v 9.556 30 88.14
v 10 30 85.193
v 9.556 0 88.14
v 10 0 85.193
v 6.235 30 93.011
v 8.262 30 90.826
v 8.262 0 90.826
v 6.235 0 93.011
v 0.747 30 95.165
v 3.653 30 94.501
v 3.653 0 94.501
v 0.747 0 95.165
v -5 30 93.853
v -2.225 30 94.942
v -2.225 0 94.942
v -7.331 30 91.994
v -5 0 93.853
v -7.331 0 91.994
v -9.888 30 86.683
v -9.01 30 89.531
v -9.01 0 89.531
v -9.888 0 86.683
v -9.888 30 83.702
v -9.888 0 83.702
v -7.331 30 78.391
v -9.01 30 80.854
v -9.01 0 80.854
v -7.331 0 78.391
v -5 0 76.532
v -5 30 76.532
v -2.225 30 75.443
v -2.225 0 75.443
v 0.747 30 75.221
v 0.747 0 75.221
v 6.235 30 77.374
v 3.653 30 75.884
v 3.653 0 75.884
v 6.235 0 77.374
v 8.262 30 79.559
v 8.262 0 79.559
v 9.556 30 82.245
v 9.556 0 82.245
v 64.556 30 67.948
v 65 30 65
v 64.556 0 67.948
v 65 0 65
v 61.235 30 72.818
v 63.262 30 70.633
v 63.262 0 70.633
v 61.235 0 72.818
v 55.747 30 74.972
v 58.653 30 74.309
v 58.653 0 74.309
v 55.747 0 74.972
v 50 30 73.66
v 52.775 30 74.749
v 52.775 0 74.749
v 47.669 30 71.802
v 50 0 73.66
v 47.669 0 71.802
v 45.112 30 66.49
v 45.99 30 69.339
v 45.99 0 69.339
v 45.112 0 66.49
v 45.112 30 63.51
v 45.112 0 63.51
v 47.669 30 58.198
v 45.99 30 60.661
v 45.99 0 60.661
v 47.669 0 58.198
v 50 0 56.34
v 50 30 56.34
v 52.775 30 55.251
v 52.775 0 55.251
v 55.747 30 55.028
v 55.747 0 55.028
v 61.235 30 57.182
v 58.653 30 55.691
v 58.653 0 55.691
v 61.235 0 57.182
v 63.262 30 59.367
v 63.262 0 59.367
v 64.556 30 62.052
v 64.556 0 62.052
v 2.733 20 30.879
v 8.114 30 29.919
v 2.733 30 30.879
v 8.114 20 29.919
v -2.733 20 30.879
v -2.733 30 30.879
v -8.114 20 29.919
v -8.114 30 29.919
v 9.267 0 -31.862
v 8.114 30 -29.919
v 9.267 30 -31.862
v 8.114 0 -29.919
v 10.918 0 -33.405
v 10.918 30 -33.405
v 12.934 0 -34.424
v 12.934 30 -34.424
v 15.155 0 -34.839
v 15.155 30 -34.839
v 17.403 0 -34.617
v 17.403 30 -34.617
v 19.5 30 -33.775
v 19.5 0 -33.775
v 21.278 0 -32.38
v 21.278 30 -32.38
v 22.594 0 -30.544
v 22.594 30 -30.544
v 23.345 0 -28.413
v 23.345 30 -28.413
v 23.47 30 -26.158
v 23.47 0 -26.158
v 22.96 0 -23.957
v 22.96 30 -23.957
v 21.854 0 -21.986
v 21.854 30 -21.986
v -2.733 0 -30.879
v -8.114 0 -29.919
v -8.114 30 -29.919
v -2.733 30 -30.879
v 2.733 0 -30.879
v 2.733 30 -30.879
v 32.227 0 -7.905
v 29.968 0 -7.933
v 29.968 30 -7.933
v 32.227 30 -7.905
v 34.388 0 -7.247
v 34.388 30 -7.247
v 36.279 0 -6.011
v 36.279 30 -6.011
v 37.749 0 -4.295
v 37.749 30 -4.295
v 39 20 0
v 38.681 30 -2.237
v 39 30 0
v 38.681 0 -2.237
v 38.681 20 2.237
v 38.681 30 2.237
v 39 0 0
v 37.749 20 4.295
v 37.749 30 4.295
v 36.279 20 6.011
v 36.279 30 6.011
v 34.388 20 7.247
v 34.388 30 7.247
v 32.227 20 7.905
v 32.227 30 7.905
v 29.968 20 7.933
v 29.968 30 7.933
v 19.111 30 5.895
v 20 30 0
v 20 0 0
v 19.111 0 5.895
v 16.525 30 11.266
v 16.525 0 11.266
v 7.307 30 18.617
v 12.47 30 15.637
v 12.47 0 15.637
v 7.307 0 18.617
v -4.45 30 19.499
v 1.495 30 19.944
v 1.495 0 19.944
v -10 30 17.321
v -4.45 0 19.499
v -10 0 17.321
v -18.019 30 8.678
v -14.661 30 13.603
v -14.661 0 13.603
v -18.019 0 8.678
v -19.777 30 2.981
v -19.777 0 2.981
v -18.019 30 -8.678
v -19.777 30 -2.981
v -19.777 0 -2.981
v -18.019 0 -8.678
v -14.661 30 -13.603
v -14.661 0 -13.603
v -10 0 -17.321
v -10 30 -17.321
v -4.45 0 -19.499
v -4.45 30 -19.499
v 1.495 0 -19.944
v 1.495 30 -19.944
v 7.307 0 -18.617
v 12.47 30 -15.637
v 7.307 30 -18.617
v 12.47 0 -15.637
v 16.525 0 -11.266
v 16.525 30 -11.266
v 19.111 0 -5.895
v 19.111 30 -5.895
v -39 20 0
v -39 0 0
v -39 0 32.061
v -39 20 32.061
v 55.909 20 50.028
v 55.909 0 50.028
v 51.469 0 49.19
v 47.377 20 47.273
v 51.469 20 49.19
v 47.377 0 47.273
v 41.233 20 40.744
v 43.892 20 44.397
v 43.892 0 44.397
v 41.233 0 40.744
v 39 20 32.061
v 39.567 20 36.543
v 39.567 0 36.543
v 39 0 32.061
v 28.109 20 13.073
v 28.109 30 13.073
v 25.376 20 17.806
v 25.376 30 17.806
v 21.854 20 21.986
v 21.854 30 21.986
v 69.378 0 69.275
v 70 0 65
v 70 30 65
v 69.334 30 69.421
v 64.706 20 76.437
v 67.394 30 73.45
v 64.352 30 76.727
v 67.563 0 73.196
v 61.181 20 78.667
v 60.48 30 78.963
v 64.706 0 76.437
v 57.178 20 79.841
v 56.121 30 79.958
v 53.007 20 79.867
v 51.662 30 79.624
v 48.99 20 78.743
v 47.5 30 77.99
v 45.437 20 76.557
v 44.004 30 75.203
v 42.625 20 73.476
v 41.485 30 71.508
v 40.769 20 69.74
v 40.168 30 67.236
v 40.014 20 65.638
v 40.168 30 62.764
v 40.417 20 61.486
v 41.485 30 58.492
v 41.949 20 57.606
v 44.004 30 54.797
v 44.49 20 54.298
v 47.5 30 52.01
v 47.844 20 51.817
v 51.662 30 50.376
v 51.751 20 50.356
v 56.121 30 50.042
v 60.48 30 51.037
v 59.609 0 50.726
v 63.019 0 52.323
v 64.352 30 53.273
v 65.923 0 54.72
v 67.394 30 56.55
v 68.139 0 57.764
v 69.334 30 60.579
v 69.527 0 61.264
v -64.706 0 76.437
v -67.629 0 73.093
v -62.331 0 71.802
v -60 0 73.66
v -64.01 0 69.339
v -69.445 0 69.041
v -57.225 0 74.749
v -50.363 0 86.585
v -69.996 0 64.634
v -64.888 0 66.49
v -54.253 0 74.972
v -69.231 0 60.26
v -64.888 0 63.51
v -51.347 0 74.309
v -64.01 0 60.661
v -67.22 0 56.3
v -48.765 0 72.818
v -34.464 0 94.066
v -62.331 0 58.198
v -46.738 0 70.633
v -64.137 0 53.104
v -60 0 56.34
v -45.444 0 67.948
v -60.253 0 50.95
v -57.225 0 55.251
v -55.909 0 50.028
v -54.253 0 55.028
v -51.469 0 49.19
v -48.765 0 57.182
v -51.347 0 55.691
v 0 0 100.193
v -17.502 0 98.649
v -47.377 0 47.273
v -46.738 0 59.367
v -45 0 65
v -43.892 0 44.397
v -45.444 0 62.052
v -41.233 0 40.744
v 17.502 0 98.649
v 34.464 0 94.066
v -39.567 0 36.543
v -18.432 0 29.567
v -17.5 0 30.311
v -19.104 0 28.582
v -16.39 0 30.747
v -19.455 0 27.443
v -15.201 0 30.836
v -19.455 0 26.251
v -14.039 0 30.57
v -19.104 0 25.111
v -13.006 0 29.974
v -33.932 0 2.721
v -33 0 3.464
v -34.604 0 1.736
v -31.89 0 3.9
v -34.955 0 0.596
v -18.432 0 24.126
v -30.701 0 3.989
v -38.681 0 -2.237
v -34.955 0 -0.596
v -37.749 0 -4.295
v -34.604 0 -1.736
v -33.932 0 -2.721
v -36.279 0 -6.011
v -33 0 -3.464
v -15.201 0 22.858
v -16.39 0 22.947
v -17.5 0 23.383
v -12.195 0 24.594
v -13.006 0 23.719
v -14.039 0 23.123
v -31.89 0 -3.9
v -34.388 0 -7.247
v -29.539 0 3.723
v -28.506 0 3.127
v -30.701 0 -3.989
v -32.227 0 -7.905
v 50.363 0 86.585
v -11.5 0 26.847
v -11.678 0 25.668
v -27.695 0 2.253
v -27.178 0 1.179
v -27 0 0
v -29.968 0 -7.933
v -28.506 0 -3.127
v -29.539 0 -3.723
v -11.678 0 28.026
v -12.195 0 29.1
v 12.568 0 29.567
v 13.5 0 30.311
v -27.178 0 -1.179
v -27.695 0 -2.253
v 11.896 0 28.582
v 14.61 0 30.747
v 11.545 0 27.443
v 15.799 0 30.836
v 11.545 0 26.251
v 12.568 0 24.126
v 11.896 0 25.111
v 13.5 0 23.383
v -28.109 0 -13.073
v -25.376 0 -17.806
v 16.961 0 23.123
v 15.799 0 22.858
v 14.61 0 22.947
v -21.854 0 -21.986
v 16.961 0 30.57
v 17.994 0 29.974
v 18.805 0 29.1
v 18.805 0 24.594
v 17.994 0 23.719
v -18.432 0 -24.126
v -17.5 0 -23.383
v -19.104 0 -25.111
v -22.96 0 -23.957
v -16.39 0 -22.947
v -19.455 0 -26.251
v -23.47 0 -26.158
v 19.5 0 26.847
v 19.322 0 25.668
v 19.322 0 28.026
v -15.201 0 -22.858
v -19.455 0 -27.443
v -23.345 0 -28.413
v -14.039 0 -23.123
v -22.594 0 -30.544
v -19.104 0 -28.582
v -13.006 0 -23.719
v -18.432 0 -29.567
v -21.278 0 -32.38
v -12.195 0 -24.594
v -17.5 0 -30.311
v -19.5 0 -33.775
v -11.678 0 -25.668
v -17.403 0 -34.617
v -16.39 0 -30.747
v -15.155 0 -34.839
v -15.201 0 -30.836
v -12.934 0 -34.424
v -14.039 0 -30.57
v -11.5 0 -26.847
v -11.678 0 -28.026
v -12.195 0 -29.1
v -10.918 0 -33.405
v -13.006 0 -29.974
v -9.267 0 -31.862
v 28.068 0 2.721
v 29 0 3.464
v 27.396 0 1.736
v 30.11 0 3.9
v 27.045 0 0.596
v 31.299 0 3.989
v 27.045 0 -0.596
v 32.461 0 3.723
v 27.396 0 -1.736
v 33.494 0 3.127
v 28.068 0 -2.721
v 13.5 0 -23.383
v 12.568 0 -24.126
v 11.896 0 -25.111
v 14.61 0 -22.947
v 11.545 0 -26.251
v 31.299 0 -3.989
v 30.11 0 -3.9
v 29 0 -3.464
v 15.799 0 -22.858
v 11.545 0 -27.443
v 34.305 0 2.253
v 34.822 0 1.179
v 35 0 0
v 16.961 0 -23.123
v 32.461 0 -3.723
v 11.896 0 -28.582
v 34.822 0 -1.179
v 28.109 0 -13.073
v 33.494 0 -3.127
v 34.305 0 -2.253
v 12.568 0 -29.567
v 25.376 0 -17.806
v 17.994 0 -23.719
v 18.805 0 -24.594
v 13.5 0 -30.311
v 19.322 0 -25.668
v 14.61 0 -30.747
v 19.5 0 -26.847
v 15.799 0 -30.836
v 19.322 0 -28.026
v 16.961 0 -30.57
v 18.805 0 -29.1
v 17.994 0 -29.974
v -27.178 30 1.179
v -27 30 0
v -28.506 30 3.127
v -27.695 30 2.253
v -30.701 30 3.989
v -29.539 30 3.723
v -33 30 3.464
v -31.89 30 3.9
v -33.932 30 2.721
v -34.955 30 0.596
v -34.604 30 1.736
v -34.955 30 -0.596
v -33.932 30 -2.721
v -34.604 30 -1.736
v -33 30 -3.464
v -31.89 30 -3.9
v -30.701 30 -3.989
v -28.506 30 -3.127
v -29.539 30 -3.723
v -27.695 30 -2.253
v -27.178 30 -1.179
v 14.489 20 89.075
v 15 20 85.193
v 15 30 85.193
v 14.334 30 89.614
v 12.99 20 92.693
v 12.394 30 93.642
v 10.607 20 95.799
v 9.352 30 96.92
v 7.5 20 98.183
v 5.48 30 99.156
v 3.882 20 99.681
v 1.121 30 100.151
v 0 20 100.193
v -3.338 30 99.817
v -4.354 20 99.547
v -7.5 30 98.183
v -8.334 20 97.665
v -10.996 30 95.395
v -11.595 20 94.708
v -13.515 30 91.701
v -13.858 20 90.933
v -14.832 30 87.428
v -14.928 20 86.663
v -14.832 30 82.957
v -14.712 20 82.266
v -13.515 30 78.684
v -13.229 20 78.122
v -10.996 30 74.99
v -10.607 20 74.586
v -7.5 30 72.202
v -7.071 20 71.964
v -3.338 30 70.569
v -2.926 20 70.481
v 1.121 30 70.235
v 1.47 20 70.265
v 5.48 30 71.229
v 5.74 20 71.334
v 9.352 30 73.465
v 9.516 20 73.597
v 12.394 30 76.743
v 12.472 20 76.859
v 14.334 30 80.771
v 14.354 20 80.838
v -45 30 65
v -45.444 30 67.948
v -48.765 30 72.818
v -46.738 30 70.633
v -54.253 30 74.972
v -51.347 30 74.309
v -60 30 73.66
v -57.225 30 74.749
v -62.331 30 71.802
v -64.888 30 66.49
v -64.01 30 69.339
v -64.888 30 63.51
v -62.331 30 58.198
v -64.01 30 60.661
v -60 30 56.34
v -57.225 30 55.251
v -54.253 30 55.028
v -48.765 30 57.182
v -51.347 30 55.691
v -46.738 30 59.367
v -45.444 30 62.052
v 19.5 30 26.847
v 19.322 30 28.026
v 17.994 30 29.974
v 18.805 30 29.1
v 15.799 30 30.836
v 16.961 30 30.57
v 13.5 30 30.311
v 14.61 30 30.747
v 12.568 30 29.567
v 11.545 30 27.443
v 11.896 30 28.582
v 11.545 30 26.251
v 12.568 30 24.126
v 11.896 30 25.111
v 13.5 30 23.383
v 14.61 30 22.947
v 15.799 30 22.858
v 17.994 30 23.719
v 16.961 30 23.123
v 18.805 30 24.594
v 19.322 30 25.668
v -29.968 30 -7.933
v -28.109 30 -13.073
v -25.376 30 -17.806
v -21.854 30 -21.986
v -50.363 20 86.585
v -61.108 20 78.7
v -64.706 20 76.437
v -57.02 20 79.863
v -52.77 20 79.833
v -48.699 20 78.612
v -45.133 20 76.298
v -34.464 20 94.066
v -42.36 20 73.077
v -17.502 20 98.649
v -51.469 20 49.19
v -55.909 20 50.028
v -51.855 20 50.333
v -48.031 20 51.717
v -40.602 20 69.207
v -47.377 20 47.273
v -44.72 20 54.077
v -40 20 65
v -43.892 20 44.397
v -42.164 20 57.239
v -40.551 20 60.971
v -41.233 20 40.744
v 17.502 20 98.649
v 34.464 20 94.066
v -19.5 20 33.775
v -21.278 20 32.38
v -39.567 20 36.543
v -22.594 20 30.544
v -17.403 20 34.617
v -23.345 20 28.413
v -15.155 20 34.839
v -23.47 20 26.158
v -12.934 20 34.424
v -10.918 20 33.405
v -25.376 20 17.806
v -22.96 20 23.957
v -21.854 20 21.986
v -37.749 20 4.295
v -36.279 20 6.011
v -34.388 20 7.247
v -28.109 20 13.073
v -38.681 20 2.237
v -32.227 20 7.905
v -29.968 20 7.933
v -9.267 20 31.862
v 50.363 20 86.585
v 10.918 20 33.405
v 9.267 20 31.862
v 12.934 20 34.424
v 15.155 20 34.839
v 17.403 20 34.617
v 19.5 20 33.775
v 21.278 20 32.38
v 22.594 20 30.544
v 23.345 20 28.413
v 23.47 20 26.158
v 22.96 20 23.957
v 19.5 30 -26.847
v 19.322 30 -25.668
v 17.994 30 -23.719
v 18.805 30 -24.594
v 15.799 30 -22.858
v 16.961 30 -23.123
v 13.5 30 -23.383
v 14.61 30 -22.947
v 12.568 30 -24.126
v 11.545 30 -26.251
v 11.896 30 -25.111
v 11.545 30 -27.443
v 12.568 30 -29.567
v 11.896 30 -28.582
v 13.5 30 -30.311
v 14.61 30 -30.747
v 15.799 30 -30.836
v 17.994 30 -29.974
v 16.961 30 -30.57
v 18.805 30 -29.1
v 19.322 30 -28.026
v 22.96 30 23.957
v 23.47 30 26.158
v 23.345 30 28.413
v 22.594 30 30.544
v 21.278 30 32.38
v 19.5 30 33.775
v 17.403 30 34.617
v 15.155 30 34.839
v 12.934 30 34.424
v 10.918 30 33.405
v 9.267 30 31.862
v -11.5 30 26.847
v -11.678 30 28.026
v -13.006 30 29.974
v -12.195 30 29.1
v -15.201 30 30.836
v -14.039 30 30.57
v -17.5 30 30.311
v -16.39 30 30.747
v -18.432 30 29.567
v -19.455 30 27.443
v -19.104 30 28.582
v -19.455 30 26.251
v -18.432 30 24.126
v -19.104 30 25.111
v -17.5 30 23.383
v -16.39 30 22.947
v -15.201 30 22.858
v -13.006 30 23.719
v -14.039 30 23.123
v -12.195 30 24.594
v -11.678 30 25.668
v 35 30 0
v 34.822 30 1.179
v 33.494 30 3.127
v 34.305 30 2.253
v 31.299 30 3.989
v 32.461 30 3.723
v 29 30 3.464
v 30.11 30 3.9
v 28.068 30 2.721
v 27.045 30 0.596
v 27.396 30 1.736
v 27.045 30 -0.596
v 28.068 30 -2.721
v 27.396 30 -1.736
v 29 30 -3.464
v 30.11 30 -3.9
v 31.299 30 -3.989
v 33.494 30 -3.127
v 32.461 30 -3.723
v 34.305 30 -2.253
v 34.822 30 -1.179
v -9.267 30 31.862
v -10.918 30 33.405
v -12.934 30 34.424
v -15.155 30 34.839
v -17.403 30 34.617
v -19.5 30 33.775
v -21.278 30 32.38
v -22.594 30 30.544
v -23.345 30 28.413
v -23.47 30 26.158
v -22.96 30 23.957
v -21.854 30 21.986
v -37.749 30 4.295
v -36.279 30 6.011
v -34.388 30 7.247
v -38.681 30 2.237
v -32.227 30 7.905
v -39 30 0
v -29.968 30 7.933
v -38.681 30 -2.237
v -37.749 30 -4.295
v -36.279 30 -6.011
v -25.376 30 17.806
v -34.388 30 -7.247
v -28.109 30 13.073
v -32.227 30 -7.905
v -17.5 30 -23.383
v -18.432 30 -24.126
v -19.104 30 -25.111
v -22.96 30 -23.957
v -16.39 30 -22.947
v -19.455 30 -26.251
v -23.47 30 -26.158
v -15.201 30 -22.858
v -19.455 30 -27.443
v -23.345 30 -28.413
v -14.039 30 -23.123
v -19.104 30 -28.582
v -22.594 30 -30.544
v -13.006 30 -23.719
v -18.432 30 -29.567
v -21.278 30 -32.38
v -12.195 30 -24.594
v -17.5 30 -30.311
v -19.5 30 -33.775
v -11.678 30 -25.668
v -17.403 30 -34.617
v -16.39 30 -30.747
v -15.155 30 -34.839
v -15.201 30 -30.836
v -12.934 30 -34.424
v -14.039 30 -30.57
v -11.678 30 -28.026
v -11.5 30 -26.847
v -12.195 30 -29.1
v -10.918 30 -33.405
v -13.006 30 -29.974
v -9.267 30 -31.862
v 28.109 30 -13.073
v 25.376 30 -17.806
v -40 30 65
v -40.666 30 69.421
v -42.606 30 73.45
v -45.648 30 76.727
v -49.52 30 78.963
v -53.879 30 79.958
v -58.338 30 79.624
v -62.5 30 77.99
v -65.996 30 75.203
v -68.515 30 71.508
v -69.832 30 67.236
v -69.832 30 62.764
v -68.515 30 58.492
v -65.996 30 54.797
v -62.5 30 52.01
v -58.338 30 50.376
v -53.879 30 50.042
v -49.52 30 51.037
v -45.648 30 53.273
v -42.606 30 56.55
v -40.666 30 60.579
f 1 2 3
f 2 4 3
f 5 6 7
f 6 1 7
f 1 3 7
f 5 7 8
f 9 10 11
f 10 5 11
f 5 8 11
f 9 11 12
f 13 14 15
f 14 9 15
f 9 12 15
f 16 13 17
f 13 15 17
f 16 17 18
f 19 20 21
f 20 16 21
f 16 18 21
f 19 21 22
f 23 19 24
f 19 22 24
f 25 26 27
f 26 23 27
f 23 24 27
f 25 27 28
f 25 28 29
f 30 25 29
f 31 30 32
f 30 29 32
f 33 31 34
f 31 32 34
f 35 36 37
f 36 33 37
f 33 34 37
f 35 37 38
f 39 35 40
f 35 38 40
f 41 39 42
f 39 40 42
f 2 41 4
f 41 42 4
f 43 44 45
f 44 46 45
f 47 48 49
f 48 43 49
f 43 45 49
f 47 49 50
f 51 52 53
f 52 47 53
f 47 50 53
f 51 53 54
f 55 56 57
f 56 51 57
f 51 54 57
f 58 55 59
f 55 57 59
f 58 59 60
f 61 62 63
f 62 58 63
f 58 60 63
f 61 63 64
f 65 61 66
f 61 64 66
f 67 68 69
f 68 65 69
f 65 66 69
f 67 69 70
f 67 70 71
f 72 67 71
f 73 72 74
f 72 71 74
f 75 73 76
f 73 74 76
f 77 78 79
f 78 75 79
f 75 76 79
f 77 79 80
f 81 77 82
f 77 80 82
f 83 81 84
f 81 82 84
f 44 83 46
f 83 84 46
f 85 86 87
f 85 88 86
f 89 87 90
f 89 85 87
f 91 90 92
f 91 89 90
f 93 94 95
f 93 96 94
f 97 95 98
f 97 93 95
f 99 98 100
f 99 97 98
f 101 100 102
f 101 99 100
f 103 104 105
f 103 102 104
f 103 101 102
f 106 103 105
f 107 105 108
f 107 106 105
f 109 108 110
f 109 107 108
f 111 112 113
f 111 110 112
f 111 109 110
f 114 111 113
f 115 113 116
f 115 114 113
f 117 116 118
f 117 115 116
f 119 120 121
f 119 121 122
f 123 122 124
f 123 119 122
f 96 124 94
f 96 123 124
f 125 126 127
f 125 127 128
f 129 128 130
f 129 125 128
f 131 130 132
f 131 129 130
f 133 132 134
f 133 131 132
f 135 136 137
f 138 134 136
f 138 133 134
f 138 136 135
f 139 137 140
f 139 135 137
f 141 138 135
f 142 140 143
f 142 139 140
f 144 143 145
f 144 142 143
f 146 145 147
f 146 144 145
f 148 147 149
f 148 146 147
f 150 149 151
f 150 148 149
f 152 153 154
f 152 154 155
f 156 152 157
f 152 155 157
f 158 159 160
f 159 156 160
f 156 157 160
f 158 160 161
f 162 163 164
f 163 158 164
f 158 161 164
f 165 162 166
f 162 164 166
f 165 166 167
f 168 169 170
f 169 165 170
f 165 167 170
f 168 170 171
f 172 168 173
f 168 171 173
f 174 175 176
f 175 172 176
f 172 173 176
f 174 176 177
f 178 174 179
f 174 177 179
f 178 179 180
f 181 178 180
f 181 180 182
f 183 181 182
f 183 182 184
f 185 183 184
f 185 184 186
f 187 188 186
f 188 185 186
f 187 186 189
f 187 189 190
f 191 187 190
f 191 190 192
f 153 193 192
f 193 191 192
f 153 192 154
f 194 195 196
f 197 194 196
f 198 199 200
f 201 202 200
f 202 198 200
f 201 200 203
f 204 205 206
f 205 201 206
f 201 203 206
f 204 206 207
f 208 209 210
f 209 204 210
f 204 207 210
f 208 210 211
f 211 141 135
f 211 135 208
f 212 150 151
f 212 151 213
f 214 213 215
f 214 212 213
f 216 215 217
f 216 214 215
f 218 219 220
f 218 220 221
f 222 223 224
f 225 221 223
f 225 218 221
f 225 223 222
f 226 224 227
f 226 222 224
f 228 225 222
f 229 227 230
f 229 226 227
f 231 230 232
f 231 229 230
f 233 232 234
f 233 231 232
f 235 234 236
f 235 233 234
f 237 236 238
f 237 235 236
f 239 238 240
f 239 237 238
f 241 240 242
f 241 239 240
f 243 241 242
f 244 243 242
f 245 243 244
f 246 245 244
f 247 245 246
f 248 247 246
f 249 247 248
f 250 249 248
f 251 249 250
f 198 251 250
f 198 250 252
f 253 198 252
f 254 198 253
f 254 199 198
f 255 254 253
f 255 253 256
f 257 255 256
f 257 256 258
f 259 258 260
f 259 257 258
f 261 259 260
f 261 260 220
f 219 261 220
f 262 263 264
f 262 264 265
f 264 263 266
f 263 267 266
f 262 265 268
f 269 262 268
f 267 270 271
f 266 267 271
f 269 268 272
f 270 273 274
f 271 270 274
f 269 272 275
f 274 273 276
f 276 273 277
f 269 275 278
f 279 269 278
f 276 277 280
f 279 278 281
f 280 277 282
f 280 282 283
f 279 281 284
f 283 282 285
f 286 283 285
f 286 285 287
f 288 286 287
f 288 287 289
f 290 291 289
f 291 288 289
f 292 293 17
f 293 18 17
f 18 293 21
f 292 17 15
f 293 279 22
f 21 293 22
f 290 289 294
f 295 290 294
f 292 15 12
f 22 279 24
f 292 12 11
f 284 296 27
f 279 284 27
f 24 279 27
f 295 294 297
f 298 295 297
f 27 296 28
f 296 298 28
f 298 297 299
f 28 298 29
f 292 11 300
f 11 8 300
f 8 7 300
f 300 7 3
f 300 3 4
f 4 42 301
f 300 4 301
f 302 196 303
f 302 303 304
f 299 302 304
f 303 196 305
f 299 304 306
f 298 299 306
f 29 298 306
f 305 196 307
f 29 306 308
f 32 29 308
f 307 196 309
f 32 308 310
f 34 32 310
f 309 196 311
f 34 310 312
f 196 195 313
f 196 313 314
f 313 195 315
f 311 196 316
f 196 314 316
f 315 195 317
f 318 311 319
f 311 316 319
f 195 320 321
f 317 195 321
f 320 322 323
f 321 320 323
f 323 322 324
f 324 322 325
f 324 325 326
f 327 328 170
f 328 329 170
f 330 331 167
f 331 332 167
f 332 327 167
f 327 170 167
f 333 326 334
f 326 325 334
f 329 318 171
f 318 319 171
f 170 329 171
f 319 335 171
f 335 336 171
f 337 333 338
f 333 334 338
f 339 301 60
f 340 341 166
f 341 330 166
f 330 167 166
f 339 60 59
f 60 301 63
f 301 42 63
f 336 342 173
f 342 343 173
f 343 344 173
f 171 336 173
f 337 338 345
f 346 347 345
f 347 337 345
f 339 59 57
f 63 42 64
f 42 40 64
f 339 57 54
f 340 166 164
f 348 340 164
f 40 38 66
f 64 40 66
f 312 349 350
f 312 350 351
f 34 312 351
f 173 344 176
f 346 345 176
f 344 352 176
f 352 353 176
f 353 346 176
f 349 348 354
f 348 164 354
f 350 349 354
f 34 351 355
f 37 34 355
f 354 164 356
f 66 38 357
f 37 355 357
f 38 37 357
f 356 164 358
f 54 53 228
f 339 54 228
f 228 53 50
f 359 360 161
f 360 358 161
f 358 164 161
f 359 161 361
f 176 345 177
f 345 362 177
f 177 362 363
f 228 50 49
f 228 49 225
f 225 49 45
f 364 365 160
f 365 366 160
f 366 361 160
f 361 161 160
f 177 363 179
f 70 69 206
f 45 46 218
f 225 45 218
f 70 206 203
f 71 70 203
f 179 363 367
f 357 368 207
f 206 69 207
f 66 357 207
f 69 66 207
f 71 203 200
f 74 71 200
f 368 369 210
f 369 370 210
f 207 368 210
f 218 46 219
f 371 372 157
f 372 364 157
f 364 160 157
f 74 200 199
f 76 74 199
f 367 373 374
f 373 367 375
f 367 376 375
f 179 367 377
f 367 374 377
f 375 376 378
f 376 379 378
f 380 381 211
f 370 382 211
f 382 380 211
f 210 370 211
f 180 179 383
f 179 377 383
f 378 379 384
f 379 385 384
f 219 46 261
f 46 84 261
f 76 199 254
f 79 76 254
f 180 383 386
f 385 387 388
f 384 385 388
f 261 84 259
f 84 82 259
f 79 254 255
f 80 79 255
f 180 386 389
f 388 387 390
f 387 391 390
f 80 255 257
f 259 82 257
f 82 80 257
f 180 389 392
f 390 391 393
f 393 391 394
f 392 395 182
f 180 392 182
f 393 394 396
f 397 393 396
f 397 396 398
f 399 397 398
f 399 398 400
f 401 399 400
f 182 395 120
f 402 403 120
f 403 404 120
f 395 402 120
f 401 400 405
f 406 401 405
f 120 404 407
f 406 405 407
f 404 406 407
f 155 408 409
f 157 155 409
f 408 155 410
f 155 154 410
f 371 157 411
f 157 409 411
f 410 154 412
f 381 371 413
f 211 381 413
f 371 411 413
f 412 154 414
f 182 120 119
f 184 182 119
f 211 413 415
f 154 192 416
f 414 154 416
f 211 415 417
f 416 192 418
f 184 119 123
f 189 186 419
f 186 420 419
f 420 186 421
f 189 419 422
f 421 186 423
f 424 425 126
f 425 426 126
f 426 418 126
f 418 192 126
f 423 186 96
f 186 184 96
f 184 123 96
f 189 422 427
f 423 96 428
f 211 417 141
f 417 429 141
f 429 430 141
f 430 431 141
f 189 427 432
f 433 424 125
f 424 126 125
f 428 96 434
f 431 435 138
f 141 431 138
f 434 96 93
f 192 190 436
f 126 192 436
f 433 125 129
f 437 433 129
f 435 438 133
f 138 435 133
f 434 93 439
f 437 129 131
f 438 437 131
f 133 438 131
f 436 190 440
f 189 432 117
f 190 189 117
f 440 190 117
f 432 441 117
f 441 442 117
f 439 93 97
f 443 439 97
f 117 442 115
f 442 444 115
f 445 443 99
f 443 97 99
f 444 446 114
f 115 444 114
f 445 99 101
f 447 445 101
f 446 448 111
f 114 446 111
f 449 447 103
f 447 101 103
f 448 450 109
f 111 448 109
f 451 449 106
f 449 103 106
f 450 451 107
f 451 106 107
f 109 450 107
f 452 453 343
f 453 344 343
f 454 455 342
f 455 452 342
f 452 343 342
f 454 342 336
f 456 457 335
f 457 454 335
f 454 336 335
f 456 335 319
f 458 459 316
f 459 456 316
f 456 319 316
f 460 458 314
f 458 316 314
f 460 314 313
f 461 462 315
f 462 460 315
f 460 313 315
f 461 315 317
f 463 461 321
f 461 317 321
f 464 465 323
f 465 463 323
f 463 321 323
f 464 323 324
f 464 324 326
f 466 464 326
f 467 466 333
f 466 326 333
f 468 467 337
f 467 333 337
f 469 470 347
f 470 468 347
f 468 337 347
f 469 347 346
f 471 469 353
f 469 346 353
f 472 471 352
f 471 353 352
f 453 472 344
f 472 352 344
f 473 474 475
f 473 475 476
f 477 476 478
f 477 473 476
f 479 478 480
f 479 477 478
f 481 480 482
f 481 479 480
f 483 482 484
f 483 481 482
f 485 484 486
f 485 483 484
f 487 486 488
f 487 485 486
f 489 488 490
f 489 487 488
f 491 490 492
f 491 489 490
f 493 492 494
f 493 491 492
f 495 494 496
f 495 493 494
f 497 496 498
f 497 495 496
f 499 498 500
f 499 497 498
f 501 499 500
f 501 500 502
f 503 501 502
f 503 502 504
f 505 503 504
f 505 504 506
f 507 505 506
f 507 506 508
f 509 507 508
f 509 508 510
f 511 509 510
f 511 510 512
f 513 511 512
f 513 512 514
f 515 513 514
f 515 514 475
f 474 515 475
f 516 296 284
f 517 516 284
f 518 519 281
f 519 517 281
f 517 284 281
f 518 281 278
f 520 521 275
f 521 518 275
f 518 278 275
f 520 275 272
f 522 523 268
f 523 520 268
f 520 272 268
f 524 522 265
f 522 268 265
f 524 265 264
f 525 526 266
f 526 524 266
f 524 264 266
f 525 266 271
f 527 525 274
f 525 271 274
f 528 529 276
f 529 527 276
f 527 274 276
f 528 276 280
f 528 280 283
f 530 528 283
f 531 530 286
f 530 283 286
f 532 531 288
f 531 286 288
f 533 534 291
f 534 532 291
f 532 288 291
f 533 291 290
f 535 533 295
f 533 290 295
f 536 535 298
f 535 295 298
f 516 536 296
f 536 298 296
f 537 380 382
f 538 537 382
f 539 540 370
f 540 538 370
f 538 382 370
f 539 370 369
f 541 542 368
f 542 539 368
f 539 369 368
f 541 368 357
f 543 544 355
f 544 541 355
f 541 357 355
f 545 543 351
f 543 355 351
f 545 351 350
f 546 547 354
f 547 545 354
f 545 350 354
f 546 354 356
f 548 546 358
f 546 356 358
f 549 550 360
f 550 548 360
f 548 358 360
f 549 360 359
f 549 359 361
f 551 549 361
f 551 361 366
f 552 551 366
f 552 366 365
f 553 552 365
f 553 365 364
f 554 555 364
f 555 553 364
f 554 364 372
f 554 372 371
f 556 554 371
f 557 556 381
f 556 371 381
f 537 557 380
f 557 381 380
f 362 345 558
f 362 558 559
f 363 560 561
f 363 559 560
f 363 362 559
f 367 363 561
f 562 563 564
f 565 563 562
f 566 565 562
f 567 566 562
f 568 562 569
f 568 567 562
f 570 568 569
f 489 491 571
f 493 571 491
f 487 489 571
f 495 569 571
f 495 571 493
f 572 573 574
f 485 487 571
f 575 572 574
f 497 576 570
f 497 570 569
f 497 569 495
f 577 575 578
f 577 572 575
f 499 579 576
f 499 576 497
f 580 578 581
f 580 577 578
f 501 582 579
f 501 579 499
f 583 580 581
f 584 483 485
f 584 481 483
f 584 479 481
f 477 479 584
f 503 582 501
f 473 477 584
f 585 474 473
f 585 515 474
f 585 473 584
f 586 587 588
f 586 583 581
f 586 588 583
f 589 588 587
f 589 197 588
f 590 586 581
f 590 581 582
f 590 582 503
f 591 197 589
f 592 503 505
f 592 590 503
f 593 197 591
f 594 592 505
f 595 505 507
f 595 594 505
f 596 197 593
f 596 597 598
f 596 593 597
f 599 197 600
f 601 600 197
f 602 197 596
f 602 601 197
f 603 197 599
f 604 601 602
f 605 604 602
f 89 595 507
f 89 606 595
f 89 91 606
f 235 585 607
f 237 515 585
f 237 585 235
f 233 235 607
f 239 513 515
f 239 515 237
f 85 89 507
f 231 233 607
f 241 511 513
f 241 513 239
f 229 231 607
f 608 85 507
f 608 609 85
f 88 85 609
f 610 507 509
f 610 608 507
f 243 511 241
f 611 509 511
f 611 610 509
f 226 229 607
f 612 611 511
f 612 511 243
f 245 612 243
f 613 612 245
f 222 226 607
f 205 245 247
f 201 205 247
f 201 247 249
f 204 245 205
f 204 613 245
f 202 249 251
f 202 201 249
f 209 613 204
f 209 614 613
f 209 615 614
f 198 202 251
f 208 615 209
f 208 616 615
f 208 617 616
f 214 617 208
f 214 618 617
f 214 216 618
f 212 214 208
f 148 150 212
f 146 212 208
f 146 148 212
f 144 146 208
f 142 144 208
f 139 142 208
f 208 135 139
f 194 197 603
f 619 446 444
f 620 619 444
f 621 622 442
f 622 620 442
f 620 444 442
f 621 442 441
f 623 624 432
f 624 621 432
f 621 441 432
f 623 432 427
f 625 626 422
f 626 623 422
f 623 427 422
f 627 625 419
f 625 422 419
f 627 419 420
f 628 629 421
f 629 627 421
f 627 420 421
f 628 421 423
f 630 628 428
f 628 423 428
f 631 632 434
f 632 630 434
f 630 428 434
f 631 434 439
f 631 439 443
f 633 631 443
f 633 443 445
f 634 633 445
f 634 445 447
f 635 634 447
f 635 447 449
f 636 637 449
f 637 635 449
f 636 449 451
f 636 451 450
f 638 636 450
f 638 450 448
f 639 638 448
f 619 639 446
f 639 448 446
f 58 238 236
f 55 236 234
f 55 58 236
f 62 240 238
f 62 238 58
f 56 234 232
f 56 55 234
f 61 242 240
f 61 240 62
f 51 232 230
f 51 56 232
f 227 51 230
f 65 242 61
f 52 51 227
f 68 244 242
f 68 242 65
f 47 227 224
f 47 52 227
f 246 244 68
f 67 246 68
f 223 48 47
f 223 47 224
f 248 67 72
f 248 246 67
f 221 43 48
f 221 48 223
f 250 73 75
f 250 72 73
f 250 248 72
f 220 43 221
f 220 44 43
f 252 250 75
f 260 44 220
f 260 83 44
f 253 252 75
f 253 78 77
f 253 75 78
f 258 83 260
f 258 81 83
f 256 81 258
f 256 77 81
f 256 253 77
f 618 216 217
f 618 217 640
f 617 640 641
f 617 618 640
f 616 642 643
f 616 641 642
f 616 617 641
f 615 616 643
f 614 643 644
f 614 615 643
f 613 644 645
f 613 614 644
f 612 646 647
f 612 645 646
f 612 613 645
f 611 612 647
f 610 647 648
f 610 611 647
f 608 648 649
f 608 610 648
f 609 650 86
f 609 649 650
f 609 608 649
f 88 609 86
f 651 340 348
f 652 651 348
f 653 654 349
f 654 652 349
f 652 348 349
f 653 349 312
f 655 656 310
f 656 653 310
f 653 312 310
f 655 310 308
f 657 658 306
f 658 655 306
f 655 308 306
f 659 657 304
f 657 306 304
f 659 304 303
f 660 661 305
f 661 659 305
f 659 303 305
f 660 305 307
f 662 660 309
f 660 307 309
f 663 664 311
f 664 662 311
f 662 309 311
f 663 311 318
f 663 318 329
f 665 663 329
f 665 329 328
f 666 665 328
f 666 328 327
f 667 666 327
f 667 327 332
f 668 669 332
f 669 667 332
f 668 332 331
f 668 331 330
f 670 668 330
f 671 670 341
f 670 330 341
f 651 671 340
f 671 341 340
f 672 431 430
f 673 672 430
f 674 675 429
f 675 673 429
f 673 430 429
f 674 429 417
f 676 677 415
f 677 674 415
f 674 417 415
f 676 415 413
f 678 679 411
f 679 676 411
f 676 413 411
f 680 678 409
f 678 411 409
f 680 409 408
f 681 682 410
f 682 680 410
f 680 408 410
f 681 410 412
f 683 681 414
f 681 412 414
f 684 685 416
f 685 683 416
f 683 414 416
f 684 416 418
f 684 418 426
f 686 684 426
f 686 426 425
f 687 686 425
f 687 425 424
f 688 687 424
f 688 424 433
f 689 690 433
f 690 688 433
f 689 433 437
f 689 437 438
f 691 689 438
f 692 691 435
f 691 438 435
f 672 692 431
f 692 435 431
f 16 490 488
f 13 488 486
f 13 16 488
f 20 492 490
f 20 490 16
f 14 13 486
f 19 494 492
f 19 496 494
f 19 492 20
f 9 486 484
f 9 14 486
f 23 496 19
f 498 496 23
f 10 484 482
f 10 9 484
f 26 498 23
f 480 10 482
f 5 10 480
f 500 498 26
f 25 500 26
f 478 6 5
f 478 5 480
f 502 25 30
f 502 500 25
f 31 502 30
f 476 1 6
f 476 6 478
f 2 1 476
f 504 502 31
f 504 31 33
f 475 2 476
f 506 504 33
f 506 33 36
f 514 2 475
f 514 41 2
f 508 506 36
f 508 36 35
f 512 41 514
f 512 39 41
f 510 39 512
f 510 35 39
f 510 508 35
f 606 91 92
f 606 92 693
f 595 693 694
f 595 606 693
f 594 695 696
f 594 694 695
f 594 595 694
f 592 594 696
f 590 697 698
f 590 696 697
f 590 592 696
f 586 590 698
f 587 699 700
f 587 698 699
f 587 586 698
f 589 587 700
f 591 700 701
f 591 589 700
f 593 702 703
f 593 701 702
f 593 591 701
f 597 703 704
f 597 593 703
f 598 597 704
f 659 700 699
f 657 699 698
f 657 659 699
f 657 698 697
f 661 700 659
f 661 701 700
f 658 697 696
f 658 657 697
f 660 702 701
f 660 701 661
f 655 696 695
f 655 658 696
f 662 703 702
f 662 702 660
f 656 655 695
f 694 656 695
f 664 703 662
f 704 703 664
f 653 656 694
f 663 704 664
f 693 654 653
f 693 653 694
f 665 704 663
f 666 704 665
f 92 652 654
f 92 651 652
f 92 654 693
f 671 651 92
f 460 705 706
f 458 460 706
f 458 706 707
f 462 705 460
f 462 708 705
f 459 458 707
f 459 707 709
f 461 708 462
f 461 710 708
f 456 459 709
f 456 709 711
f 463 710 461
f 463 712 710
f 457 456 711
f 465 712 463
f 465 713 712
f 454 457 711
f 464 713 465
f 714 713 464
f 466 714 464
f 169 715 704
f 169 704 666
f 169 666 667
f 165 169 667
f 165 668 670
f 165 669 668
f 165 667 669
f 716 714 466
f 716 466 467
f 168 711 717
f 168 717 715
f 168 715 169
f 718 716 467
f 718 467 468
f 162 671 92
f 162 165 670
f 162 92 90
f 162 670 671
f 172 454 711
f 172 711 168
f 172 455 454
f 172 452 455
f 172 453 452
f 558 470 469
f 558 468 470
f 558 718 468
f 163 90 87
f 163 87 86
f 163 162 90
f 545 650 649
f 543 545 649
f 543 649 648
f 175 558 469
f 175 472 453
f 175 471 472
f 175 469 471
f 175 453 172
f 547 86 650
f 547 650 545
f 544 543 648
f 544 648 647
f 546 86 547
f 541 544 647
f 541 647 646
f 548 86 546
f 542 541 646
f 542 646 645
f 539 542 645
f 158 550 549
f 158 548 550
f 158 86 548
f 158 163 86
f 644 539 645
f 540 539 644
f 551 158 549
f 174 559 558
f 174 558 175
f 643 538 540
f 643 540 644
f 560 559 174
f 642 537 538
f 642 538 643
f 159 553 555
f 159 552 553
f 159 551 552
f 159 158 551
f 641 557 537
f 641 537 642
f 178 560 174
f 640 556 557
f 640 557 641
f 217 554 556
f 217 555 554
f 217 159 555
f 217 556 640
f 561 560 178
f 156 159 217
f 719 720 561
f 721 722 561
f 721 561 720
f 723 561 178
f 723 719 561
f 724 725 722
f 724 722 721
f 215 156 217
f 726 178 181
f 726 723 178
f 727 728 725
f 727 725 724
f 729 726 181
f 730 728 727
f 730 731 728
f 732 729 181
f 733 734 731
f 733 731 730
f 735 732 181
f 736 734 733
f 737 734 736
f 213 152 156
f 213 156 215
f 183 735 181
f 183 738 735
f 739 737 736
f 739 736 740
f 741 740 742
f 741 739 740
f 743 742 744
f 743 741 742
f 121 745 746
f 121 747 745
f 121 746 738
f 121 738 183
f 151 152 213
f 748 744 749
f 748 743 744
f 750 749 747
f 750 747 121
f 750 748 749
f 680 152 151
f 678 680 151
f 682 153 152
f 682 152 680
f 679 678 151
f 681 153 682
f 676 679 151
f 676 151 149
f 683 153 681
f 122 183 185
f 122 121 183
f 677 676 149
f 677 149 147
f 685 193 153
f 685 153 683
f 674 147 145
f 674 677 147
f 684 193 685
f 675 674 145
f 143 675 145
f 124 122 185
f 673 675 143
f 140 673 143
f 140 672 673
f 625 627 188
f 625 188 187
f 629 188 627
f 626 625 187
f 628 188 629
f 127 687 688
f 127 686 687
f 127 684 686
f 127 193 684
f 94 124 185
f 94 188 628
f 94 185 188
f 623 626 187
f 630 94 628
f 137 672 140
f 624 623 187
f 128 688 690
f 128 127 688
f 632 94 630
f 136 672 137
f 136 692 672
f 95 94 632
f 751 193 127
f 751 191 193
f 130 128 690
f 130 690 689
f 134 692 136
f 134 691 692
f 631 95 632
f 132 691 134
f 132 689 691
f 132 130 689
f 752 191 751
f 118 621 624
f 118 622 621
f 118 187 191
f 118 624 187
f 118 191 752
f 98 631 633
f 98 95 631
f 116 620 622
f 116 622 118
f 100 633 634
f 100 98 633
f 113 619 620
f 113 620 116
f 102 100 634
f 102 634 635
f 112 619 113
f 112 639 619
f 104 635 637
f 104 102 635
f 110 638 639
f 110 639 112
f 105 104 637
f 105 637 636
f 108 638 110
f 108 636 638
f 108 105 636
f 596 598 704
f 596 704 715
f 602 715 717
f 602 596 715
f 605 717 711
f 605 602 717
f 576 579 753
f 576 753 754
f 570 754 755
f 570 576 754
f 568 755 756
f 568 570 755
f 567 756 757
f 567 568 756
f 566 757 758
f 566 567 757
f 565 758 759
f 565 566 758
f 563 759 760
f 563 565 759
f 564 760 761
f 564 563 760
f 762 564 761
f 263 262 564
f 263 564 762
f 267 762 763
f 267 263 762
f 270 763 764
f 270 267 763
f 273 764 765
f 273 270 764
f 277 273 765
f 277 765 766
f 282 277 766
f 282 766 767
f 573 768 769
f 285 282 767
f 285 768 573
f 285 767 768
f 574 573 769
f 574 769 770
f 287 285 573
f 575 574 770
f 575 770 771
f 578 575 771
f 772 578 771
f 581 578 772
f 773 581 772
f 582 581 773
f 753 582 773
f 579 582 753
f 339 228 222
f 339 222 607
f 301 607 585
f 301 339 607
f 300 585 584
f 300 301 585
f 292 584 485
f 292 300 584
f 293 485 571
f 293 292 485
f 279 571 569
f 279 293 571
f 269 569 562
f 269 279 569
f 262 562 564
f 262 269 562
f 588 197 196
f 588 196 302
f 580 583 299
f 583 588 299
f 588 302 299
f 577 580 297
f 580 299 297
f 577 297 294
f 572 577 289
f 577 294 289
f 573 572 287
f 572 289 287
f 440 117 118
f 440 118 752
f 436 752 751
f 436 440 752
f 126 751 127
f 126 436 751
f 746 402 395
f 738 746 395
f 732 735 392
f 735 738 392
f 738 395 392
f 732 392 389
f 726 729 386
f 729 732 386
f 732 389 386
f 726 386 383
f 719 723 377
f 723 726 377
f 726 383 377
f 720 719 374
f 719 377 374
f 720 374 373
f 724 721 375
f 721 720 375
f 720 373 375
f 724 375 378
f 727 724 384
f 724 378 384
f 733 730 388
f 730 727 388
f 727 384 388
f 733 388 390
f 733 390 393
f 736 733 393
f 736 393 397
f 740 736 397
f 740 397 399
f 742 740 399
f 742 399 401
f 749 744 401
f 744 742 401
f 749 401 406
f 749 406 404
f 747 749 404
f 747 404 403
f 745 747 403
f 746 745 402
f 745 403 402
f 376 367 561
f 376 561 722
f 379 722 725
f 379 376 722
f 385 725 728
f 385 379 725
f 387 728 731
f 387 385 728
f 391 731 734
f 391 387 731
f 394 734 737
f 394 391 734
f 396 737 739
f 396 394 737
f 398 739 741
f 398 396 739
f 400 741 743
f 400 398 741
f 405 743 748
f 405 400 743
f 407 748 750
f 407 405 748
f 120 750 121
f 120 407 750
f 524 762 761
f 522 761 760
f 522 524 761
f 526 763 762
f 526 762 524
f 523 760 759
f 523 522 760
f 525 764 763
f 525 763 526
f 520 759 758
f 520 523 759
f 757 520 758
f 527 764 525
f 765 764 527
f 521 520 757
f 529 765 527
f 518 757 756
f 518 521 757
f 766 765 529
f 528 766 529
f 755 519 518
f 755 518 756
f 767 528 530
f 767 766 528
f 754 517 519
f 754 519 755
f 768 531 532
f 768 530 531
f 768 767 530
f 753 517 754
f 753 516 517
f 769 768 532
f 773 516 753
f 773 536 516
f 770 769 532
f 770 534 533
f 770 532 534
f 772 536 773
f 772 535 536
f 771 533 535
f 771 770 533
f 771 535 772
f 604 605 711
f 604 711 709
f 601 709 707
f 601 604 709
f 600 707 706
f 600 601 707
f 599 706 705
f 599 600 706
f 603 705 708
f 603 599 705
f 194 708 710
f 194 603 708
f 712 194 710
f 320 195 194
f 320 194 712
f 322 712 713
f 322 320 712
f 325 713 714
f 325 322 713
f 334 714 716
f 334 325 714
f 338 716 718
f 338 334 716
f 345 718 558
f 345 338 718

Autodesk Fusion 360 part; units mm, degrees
sketch "Sketch1" plane through (0, 0, 0) normal (0, 1, 0) x (1, 0, 0)
  line L0 (-50, 0) -> (50, 0) construction
  line L1 (0, 105.7095) -> (0, -105.7095) construction
  line L2 (-55, -65) -> (55, -65) construction
  circle A0 centre (-55, -65) radius 15
  circle A1 centre (-55, -65) radius 15
  circle A2 centre (55, -65) radius 15
  circle A3 centre (-55, -65) radius 10
  circle A4 centre (55, -65) radius 10
  circle A5 centre (0, 0) radius 20
  circle A6 centre (31, 0) radius 4
  circle A7 centre (-31, 0) radius 4
  line L3 (0, 0) -> (44, 0) construction
  circle A8 centre (-15.5, -26.8468) radius 4
  circle A9 centre (15.5, 26.8468) radius 4
  line L4 (0, 0) -> (45, 0) construction
  line L5 (0, 0) -> (44, 0) construction
  circle A10 centre (15.5, -26.8468) radius 4
  circle A11 centre (-15.5, 26.8468) radius 4
  arc A12 (-29.9677, 7.9331) -> (-29.9677, -7.9331) centre (-31, 0) ccw
  arc A13 (-8.1136, 29.9194) -> (-21.8542, 21.9863) centre (-15.5, 26.8468) ccw
  arc A14 (-21.8542, 21.9863) -> (-29.9677, 7.9331) centre (0, 0) ccw
  arc A15 (21.8542, 21.9863) -> (8.1136, 29.9194) centre (15.5, 26.8468) ccw
  arc A16 (8.1136, 29.9194) -> (-8.1136, 29.9194) centre (0, 0) ccw
  arc A17 (29.9677, -7.9331) -> (29.9677, 7.9331) centre (31, 0) ccw
  arc A18 (29.9677, 7.9331) -> (21.8542, 21.9863) centre (0, 0) ccw
  arc A19 (8.1136, -29.9194) -> (21.8542, -21.9863) centre (15.5, -26.8468) ccw
  arc A20 (-21.8542, -21.9863) -> (-8.1136, -29.9194) centre (-15.5, -26.8468) ccw
  arc A21 (-29.9677, -7.9331) -> (-21.8542, -21.9863) centre (0, 0) ccw
  arc A22 (-8.1136, -29.9194) -> (8.1136, -29.9194) centre (0, 0) ccw
  arc A23 (21.8542, -21.9863) -> (29.9677, -7.9331) centre (0, 0) ccw
  line L6 (39, 0) -> (39, -32.0607)
  arc A24 (-64.7059, -76.4366) -> (64.7059, -76.4366) centre (0, -0.1926) ccw
  circle A25 centre (0, -85.1926) radius 15
  circle A26 centre (0, -85.1926) radius 10
  arc A27 (39, -32.0607) -> (55.9091, -50.0276) centre (57, -32.0607) ccw
  arc A28 (-55.9091, -50.0276) -> (-39, -32.0607) centre (-57, -32.0607) ccw
  line L7 (-39, 0) -> (-39, -32.0607)
  point P0 (0, -65)
  dimension "d1" = 100
  dimension "d2" = 65
  dimension "d3" = 110
  dimension "d4" = 30
  dimension "d5" = 30
  dimension "d6" = 30
  dimension "d7" = 20
  dimension "d8" = 20
  dimension "d11" = 8
  dimension "d12" = 16
  dimension "d21" = 105.7095
  dimension "d22" = 200
  dimension "d23" = 30
  dimension "d24" = 20
  dimension "d25" = 36
  dimension "d26" = 8
  dimension "d27" = 8
  dimension "d28" = 8
  dimension "d29" = 40
  dimension "d30" = 8
  dimension "d31" = 8
  dimension "d32" = 8
  dimension "d33" = 31
  dimension "d34" = 8
  dimension "d35" = 8
extrude "Extrude1" add sketch "Sketch1" along normal blind 20 contours A0 A1 A2 A12 A17 A19 A20 A21 A22 A23 L6 A24 A27 A28 L7 makes body 1
extrude "Extrude2" add sketch "Sketch1" along normal blind 30 separate body contours A0 A1 | A12 A13 A14 A15 A16 A17 A18 A19 A20 A21 A22 A23 | A2 makes body 2 at (-40.0745, 10, 66.4935) makes body 3 at (69.9255, 10, 66.4935) makes body 4 at (19.9751, 10, 0.9969)
extrude "Extrude3" add sketch "Sketch1" along normal blind 30 contours A25 bodies 1
combine "Combine1" operation add target body 1 tool bodies 4 2 3
